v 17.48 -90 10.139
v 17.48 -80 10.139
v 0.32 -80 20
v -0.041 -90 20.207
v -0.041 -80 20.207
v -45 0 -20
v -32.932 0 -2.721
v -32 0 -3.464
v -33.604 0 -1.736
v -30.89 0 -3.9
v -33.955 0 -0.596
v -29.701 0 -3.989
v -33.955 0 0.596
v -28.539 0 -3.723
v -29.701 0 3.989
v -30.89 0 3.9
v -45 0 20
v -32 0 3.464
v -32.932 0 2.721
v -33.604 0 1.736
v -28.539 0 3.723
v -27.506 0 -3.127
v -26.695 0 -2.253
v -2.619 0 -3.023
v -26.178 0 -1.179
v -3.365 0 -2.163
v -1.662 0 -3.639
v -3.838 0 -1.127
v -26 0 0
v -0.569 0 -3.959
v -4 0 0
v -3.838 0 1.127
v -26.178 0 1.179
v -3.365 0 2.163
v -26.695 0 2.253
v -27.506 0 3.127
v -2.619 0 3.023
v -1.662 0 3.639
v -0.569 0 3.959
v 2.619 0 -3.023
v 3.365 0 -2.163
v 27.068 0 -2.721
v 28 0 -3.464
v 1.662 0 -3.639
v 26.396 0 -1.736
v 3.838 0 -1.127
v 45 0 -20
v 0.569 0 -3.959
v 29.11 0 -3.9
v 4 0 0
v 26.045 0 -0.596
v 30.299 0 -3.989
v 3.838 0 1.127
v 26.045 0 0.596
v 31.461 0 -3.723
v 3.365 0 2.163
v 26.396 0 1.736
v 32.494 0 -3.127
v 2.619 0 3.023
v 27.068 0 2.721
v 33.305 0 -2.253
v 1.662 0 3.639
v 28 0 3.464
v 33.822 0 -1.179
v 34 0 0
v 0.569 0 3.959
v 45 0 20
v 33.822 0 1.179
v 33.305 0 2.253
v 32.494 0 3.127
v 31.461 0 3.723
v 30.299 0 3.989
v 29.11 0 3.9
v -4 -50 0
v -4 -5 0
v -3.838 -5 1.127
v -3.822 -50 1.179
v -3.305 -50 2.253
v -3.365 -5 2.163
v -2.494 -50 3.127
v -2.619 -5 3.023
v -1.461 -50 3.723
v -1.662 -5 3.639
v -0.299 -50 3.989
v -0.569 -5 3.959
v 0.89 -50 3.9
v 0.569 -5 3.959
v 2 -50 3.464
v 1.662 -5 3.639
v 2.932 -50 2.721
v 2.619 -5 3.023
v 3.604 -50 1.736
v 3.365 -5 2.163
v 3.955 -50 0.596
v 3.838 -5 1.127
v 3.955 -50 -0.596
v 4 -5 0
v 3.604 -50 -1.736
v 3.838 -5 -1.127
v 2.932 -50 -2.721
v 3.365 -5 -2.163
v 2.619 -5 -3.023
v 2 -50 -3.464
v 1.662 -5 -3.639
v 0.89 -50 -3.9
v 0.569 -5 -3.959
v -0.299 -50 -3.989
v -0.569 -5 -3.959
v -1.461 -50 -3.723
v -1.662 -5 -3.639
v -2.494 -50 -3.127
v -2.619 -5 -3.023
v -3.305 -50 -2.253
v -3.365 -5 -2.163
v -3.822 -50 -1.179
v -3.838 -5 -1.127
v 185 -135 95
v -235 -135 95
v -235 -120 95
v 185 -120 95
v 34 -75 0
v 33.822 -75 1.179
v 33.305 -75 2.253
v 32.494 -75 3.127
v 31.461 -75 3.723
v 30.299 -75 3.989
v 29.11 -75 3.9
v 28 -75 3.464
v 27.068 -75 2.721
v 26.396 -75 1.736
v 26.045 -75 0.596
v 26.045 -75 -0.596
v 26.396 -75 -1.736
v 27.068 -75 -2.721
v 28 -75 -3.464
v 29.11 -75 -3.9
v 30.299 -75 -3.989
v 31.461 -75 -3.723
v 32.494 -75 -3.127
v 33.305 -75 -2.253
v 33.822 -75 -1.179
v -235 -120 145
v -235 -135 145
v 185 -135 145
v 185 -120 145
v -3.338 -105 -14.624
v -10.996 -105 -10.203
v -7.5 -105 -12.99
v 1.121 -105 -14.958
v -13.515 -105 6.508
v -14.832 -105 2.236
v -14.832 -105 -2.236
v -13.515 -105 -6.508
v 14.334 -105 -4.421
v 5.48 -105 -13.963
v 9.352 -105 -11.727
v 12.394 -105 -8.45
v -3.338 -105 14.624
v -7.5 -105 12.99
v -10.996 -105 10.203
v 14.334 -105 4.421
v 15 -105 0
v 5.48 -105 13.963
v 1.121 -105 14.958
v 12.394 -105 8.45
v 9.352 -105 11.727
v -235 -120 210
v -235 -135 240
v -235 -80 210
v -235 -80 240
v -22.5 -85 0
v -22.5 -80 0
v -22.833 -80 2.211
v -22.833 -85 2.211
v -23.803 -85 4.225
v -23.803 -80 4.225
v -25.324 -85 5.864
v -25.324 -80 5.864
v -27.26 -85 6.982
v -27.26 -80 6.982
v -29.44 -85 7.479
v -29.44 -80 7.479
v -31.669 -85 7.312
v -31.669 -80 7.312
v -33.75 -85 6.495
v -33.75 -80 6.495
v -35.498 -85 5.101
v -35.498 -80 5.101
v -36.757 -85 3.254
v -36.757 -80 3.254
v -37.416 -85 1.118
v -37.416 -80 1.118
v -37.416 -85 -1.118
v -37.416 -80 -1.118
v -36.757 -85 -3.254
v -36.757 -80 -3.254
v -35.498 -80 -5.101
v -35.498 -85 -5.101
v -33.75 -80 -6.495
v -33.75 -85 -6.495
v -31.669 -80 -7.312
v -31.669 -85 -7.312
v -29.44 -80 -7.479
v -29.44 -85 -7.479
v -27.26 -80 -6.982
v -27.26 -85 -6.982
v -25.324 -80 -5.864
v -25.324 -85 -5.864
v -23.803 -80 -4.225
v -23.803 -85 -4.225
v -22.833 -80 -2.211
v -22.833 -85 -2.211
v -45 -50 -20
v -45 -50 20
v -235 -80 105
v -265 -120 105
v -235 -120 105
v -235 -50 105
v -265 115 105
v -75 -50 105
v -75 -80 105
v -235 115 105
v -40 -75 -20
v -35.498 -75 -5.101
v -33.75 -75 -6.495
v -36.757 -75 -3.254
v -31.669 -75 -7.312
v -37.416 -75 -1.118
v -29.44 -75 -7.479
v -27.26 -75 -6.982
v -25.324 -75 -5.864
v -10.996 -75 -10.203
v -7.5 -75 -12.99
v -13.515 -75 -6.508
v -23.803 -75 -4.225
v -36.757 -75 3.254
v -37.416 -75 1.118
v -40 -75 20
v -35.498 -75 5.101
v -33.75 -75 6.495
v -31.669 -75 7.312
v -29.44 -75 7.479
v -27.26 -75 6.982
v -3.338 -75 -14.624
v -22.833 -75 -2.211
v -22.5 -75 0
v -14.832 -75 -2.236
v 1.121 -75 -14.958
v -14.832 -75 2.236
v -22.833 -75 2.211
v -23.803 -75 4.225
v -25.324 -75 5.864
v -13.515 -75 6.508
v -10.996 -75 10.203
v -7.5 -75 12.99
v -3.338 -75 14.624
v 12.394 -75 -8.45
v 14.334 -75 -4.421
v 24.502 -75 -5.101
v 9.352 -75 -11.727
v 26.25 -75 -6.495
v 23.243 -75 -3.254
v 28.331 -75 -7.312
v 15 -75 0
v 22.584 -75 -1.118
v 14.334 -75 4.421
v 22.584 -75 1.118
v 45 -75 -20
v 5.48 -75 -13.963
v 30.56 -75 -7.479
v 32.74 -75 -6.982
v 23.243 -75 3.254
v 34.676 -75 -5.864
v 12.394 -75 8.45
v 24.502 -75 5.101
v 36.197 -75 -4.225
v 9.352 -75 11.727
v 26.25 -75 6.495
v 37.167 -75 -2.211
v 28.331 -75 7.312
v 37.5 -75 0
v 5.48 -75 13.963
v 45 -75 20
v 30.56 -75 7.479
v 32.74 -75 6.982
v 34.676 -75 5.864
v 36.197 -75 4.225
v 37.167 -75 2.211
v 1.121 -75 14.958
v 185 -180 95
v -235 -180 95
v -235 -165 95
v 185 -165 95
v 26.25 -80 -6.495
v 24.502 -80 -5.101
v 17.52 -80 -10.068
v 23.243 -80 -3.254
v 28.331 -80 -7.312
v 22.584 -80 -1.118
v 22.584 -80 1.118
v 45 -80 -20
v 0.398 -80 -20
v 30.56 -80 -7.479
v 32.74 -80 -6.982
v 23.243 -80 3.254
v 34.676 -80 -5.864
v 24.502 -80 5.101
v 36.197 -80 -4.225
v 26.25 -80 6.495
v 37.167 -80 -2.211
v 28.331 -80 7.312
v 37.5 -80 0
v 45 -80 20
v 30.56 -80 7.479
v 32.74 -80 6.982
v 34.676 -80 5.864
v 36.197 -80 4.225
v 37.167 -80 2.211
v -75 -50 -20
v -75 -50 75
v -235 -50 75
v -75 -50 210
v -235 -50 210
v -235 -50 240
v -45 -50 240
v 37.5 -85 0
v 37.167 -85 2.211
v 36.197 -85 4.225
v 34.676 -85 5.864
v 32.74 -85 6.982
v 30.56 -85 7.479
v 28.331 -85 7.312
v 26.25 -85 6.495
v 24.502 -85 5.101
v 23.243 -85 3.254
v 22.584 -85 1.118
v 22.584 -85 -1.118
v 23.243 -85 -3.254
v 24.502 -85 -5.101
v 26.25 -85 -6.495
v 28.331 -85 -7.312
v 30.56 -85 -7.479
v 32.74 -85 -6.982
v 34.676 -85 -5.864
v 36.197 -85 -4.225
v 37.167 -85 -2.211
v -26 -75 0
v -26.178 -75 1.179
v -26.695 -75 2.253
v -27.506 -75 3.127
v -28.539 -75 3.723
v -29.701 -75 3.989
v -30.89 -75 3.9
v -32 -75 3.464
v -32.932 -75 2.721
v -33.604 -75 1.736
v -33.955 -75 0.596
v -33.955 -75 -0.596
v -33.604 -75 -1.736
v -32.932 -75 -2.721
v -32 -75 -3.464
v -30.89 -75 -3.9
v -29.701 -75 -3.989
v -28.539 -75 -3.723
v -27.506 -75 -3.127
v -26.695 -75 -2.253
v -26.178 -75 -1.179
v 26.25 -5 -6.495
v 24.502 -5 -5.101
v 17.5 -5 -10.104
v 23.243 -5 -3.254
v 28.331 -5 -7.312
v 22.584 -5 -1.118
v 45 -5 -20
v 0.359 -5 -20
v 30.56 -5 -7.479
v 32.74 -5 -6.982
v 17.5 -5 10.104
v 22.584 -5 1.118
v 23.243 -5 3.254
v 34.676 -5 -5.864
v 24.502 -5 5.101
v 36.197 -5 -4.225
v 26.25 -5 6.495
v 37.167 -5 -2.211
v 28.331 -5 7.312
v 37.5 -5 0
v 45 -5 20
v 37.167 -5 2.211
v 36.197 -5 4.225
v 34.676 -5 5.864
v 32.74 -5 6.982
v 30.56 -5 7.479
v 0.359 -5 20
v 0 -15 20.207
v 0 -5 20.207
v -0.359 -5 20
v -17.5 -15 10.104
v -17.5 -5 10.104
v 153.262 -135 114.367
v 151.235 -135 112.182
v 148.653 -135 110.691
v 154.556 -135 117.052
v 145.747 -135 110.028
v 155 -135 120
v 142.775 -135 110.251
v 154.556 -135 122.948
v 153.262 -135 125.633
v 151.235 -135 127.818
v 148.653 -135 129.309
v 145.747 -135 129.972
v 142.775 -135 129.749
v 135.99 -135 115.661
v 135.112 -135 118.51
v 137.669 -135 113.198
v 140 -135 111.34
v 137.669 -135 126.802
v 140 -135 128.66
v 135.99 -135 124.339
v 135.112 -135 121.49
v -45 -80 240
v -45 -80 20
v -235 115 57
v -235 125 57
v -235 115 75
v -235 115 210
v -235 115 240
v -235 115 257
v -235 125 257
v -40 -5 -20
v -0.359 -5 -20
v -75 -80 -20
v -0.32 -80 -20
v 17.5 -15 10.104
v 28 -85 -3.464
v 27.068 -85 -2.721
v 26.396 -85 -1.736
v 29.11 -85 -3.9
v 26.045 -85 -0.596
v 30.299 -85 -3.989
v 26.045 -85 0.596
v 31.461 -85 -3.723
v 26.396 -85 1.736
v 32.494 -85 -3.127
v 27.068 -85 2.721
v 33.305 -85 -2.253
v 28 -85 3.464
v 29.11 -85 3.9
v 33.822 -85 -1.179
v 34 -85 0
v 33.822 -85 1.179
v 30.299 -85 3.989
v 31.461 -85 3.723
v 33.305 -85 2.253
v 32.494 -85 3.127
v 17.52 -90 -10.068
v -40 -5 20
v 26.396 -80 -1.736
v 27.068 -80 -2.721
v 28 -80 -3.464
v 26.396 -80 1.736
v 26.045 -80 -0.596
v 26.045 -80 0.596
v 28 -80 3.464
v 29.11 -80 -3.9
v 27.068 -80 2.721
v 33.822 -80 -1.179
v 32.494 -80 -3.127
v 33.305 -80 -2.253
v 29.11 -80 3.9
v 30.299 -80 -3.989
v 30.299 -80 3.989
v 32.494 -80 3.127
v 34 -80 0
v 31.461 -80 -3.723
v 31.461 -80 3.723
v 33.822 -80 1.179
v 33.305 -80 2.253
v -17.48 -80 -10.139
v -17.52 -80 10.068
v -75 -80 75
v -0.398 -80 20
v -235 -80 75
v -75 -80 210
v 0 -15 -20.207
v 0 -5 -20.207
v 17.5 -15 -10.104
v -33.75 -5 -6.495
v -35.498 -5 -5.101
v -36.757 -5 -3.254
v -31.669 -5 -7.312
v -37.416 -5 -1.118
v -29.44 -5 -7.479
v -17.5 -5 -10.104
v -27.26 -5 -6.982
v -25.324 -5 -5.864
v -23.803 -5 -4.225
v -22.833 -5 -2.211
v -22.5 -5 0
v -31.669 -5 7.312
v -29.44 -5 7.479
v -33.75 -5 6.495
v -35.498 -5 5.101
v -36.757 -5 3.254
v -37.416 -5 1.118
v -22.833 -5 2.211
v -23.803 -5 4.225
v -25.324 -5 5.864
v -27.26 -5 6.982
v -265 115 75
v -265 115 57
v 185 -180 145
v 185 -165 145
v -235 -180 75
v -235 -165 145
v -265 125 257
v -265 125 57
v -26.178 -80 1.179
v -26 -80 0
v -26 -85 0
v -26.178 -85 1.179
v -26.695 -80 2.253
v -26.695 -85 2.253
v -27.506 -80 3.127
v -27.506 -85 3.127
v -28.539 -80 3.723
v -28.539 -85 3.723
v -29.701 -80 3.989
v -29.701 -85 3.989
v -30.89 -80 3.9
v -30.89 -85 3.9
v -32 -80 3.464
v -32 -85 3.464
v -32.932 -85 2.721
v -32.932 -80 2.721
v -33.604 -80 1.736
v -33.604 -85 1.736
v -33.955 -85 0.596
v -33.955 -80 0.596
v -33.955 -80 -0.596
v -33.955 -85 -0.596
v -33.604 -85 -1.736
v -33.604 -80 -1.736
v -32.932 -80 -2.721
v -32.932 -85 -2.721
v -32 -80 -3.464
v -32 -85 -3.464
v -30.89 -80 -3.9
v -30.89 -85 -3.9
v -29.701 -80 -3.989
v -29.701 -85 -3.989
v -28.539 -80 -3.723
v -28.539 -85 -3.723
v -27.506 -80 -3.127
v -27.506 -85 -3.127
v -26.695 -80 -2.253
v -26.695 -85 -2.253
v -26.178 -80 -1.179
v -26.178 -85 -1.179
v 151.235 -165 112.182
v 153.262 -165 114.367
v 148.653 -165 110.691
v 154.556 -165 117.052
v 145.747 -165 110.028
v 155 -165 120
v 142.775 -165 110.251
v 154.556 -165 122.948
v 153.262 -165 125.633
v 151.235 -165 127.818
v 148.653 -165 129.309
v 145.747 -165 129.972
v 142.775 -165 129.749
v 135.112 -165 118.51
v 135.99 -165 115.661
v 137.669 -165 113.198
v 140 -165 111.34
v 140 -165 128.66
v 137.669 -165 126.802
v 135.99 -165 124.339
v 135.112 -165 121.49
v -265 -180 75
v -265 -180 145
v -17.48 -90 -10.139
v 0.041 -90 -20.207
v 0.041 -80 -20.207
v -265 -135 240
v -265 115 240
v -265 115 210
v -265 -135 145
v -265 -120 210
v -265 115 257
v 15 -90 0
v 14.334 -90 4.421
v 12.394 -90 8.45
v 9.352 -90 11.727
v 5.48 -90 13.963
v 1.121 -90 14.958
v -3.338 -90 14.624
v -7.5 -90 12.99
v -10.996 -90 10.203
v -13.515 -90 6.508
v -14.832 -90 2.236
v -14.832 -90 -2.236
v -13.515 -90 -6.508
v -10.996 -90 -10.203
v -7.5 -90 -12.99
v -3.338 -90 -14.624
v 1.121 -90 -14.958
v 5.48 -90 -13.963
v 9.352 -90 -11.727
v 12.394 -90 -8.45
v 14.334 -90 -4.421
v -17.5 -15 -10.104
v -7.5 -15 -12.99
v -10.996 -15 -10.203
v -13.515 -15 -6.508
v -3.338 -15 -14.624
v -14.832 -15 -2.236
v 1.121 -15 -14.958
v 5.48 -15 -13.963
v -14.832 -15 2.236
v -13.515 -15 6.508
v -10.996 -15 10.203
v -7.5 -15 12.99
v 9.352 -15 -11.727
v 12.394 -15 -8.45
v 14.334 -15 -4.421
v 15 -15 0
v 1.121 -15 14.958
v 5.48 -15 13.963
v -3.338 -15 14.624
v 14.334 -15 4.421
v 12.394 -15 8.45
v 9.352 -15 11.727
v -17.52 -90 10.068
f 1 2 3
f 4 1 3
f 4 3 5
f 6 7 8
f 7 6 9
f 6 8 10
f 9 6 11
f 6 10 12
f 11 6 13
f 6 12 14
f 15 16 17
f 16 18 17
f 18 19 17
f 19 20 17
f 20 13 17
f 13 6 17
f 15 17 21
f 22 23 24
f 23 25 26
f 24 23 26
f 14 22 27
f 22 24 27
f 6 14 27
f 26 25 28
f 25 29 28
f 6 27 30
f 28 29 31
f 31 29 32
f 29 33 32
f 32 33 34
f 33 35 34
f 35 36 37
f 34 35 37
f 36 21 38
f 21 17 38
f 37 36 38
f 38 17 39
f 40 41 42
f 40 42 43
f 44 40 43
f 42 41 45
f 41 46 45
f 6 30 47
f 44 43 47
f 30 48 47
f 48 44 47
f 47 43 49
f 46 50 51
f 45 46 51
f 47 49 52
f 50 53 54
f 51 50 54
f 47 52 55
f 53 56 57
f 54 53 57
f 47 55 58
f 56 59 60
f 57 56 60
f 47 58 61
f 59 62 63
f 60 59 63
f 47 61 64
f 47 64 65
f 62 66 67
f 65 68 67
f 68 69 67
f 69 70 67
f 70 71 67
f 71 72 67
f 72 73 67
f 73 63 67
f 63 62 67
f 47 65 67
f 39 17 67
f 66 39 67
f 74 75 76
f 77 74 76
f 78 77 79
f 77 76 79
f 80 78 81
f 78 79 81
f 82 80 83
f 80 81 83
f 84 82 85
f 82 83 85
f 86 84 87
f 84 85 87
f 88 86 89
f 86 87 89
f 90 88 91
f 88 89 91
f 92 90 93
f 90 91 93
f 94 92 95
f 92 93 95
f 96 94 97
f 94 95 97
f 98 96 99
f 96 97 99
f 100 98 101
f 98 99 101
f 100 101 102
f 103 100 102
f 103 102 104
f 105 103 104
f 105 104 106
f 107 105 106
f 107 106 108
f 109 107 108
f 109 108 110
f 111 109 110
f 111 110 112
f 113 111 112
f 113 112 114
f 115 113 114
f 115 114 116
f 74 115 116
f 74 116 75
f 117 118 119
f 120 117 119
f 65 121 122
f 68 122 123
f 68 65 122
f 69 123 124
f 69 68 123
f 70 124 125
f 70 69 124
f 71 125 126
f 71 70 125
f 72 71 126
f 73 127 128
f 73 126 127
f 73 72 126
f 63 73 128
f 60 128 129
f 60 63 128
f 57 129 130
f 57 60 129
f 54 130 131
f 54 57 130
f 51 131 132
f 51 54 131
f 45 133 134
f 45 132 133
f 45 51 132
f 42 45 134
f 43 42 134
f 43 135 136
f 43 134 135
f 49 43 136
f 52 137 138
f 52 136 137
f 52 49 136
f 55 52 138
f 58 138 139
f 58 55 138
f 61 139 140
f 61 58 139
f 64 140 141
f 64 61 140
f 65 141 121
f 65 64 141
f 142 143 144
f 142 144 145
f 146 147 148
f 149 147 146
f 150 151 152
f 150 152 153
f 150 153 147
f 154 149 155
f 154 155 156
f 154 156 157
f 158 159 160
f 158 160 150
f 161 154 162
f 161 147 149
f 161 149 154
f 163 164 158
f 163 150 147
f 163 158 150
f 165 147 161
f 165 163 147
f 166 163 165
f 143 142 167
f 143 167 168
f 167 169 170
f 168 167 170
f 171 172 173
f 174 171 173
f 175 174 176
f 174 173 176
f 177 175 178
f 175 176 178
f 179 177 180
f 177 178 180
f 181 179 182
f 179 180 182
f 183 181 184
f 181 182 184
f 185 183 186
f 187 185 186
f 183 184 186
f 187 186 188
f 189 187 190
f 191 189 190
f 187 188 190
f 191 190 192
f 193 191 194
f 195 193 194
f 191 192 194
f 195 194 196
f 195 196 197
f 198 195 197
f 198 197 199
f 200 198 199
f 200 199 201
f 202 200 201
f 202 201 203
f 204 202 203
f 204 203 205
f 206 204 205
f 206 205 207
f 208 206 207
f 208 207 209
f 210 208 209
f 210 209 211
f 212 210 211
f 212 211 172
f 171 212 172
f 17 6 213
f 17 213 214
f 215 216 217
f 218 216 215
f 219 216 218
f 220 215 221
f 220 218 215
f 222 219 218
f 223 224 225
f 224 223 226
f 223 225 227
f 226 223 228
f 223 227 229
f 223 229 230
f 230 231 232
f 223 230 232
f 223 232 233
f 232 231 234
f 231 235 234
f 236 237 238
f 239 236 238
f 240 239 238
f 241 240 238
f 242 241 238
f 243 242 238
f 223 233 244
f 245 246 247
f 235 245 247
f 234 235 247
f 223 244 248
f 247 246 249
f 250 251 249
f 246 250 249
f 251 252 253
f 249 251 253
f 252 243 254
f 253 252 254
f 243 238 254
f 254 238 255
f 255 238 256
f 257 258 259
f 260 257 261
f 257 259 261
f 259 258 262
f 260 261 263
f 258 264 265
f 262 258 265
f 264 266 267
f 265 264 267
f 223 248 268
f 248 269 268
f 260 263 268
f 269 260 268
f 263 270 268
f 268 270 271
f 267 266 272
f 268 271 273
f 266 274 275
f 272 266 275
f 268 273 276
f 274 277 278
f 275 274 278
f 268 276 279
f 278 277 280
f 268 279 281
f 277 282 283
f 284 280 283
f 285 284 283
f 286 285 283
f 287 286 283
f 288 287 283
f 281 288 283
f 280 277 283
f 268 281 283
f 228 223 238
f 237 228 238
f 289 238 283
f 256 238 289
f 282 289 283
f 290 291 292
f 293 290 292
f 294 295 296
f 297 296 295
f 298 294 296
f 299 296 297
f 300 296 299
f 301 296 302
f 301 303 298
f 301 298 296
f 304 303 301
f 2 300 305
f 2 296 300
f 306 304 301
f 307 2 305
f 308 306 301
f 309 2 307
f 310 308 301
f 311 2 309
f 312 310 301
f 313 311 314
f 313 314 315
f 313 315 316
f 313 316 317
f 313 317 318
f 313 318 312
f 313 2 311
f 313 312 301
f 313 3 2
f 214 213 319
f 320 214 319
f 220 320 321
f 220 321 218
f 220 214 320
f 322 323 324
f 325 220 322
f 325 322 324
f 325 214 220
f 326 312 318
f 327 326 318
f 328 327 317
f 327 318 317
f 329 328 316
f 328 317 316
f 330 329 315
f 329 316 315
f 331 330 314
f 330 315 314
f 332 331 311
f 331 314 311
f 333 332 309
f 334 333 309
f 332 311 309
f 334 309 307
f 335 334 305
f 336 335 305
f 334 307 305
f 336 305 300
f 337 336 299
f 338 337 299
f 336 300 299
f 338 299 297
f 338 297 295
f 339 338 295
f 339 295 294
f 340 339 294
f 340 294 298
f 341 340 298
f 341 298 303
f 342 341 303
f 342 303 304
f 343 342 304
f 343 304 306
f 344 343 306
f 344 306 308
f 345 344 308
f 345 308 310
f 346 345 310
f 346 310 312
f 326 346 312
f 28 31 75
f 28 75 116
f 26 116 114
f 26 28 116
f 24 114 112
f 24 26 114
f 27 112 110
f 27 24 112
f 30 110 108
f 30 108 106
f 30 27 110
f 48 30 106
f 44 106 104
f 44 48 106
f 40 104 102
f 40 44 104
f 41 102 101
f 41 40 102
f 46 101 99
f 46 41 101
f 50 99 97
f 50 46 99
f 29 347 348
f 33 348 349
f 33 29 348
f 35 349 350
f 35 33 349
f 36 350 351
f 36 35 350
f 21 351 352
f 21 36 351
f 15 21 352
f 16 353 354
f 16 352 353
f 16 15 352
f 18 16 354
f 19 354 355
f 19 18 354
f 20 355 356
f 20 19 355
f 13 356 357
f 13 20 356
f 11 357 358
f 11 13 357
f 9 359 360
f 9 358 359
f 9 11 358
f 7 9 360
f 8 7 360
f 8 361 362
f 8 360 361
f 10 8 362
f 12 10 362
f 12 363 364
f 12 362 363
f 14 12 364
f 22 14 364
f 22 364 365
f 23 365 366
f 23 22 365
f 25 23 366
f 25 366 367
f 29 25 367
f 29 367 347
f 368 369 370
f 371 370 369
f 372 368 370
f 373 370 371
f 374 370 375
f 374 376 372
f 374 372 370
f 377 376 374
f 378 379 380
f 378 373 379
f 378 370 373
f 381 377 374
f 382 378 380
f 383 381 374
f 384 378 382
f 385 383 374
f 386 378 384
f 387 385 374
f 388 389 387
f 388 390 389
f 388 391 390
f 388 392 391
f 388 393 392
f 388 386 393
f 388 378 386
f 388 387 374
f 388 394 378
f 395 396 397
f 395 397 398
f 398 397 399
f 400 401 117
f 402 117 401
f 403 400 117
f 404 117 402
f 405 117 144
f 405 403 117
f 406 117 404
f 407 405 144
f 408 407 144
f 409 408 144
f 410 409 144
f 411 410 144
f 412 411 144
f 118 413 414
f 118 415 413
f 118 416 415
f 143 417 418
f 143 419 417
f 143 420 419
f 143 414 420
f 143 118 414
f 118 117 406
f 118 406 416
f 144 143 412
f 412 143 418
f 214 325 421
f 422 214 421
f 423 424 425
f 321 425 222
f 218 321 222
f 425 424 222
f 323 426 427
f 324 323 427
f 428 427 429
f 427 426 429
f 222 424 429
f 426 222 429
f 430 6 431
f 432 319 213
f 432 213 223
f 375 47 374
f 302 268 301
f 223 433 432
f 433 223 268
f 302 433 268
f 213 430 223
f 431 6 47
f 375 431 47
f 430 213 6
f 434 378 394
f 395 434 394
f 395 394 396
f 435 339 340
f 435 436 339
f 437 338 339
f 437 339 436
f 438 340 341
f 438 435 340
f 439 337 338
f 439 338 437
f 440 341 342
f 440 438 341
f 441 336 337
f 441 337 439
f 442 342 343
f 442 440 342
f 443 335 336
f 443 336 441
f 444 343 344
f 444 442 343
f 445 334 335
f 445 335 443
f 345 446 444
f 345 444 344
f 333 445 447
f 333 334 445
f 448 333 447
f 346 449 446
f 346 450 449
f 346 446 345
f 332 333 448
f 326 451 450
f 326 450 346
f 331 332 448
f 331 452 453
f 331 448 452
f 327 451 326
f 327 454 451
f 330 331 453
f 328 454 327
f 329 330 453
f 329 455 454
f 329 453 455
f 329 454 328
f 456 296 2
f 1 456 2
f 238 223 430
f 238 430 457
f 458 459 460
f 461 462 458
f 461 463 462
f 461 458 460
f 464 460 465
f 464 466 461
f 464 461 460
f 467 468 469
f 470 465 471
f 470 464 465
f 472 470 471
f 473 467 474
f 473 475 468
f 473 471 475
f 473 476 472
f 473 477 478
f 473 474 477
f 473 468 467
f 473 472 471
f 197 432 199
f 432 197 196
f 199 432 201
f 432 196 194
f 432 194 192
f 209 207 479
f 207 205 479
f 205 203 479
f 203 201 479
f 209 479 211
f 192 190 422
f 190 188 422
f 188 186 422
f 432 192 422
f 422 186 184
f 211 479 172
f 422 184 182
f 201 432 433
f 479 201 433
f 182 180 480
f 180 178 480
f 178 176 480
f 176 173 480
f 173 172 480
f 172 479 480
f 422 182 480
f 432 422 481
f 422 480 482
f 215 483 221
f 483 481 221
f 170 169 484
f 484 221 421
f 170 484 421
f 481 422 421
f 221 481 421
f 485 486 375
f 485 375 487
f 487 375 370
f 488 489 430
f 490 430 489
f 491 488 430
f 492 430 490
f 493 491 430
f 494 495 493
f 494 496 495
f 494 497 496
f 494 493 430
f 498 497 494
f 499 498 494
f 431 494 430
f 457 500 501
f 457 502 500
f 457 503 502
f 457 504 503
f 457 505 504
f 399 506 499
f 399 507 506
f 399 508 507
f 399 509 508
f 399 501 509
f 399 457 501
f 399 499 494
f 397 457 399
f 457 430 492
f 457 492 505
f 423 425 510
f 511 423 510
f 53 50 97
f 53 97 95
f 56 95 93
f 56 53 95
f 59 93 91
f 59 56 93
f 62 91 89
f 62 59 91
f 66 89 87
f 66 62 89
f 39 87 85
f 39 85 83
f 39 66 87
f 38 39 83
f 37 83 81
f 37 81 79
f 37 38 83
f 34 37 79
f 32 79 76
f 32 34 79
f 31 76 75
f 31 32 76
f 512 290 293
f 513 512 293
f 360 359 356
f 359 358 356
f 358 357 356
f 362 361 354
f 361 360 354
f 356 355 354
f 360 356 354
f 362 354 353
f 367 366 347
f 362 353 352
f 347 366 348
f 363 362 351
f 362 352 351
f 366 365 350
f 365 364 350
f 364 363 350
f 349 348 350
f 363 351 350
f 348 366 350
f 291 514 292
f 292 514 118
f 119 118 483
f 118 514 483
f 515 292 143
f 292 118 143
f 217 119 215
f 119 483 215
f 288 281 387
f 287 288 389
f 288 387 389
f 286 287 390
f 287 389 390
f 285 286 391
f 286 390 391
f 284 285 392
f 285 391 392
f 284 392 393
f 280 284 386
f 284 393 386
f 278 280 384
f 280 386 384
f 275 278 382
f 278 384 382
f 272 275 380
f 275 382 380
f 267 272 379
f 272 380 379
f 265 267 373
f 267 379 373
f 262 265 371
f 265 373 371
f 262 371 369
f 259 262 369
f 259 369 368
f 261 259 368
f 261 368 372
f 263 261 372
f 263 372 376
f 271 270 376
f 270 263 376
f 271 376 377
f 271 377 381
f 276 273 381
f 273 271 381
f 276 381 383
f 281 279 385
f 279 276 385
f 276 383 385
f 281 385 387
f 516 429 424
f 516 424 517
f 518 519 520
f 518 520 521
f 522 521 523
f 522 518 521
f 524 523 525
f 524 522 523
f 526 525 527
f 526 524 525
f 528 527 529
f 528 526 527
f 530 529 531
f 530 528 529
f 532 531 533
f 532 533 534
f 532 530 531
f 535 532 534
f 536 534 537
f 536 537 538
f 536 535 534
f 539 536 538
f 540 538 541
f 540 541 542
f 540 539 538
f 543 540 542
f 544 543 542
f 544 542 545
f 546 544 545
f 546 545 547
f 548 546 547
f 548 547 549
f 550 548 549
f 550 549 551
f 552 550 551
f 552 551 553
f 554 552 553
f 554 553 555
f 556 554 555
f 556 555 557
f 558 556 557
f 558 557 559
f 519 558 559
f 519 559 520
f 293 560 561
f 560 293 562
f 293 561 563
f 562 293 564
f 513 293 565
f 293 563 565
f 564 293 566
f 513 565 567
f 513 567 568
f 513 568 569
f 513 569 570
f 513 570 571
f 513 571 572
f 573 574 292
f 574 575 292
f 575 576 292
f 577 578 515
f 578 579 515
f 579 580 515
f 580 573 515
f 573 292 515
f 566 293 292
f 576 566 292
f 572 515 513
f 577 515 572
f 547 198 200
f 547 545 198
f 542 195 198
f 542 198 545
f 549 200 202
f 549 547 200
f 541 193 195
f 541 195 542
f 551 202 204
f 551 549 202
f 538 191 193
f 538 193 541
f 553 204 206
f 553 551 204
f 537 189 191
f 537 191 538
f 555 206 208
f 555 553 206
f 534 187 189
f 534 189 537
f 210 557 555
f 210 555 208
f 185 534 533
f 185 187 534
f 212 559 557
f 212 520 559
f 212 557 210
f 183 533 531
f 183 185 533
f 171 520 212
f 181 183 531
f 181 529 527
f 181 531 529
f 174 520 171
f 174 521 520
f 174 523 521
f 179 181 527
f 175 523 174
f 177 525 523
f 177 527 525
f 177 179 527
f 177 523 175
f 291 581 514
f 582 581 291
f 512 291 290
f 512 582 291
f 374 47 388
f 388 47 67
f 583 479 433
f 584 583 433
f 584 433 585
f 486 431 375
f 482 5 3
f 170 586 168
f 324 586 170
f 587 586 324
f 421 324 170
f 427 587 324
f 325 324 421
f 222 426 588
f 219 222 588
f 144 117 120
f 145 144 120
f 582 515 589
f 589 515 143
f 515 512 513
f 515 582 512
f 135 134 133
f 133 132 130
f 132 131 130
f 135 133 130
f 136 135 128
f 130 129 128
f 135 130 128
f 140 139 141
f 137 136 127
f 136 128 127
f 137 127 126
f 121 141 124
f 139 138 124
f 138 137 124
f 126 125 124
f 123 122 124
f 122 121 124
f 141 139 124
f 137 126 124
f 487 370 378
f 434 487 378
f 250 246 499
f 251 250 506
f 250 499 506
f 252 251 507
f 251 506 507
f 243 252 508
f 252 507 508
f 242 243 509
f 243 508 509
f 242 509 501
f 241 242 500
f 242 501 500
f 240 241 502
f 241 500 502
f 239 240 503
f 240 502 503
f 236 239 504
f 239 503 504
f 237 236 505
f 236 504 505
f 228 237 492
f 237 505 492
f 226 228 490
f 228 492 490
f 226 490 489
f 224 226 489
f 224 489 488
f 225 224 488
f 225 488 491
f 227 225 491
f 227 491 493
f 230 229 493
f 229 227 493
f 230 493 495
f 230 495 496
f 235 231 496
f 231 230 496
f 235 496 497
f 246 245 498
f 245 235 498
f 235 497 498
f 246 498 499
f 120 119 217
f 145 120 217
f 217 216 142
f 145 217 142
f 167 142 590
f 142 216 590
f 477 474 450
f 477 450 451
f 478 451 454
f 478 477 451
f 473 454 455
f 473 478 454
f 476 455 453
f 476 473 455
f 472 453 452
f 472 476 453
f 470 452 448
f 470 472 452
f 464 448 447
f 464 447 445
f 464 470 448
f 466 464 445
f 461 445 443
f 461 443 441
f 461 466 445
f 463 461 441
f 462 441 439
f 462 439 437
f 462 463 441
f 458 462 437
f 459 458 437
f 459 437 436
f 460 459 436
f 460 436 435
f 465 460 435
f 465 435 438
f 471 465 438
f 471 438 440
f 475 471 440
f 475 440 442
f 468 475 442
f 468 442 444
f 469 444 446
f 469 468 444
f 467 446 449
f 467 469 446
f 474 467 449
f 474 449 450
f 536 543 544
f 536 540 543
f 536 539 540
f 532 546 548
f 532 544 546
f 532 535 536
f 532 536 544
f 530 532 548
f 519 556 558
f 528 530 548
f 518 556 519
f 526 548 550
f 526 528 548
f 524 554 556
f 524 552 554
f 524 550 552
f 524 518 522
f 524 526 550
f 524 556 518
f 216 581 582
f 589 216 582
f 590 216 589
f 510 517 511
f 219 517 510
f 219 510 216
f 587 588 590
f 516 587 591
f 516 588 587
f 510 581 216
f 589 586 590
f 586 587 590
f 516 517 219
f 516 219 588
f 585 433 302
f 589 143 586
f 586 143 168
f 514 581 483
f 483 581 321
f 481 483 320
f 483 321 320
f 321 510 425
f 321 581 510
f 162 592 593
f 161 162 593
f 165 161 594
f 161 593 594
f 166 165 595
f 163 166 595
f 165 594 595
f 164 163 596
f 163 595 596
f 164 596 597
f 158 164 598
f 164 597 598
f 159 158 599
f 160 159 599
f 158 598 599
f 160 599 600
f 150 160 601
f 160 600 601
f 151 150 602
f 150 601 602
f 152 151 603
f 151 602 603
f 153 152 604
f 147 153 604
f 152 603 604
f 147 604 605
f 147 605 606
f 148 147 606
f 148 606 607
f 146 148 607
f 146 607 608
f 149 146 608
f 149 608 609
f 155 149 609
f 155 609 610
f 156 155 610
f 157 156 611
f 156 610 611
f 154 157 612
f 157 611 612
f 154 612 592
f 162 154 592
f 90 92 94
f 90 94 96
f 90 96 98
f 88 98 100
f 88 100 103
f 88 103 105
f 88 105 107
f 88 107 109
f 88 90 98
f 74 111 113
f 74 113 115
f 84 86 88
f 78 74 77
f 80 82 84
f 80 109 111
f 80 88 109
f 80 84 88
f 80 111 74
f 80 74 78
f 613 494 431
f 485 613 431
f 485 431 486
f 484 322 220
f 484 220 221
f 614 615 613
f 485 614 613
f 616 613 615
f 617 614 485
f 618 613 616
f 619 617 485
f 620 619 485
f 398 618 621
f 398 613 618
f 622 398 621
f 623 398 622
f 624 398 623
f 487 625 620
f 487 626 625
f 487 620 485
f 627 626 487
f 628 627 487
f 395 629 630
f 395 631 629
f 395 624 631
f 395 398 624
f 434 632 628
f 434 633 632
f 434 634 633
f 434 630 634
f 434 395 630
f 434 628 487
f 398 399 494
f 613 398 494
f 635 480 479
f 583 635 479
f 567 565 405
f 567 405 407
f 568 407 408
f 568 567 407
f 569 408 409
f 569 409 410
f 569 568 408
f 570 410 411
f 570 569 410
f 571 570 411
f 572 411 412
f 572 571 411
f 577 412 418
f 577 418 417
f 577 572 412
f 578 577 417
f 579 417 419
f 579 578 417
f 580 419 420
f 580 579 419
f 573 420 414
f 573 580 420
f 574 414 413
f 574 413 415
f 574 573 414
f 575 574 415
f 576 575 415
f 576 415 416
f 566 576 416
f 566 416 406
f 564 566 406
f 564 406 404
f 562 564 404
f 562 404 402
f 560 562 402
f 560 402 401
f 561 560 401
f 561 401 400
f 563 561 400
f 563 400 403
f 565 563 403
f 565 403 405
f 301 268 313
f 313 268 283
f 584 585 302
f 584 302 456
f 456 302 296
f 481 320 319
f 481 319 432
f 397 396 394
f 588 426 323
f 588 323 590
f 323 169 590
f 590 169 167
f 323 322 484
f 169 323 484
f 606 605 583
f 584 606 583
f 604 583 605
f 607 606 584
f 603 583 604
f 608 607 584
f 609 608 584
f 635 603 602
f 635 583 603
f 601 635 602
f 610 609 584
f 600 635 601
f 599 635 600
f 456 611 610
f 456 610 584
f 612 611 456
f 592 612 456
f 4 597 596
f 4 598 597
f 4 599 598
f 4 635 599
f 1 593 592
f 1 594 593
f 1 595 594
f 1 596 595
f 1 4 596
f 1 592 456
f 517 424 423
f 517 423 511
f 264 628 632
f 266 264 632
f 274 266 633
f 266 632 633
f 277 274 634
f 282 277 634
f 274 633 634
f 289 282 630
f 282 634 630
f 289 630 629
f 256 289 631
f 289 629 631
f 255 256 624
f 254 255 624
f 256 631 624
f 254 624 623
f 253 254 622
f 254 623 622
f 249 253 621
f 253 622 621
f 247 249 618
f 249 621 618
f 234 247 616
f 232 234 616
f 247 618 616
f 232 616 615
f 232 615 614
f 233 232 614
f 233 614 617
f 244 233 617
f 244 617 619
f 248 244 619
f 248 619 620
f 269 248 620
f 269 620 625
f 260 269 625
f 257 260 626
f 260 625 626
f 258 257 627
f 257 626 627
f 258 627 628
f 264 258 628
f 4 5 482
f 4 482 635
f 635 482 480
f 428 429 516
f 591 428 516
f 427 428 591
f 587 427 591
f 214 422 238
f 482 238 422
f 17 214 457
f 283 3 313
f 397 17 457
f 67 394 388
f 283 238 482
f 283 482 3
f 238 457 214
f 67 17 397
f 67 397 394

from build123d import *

# Parameters (mm, degrees)
F0_W      = 90
F0_H      = 40
F0_R      = 4
F1_DEPTH  = 5
F3_DEPTH  = 10
F4_R      = 15
F5_DEPTH  = 60
F6_R      = 7.5
F6_R_2    = 4
F7_DEPTH  = 80
F8_W      = 90
F8_H      = 40
F9_DEPTH  = 5
F11_DEPTH = 10
F12_R     = 15
F13_DEPTH = 15
F14_W     = 5
F14_H     = 40
F15_DEPTH = 70
F16_R     = 4
F17_DEPTH = 50
F18_W     = 30
F18_H     = 260
F19_DEPTH = 30
F20_W     = 30
F20_H     = 30
F21_DEPTH = 190
F22_W     = 30
F22_H     = 30
F23_DEPTH = 205
F24_DEPTH = 40
F25_W     = 30
F25_H     = 200
F26_DEPTH = 10
F27_W     = 30
F27_H     = 165
F28_DEPTH = 60
F29_W     = 15
F29_H     = 50
F30_DEPTH = 420
F31_W     = 45
F31_H     = 121.339908
F32_DEPTH = 40
F33_R     = 10
F34_DEPTH = 60


with BuildPart() as f1:
    # F0 (on Front) → F1 (new body)
    with BuildSketch(Plane.XZ):
        Rectangle(F0_W, F0_H)
        with Locations((-30, 0)):
            Circle(F0_R, mode=Mode.SUBTRACT)
        Circle(F0_R, mode=Mode.SUBTRACT)
        with Locations((30, 0)):
            Circle(F0_R, mode=Mode.SUBTRACT)
    extrude(amount=F1_DEPTH)

    # F2 (on face) → F3 (join)
    with BuildSketch(Plane.XZ.offset(5)):
        Polygon((17.5, -10.10363), (17.5, 10.10363), (0, 20.207259), (-17.5, 10.10363), (-17.5, -10.10363), (0, -20.207259), align=None)
    extrude(amount=F3_DEPTH)

    # F4 (on face) → F5 (join)
    with BuildSketch(Plane.XZ.offset(15)):
        Circle(F4_R)
    extrude(amount=F5_DEPTH)

    # F6 (on face) → F7 (join)
    with BuildSketch(Plane.XZ.offset(5)):
        with Locations((30, 0)):
            Circle(F6_R)
        with Locations((30, 0)):
            Circle(F6_R_2, mode=Mode.SUBTRACT)
        with Locations((-30, 0)):
            Circle(F6_R)
        with Locations((-30, 0)):
            Circle(F6_R_2, mode=Mode.SUBTRACT)
    extrude(amount=F7_DEPTH)

    # F8 (on face) → F9 (join)
    with BuildSketch(Plane.XZ.offset(75)):
        Rectangle(F8_W, F8_H)
    extrude(amount=F9_DEPTH)

    # F10 (on face) → F11 (join)
    with BuildSketch(Plane.XZ.offset(80)):
        Polygon((0.040823, -20.207218), (17.520376, -10.068255), (17.479553, 10.138963), (-0.040823, 20.207218), (-17.520376, 10.068255), (-17.479553, -10.138963), align=None)
    extrude(amount=F11_DEPTH)

    # F12 (on face) → F13 (join)
    with BuildSketch(Plane.XZ.offset(90)):
        Circle(F12_R)
    extrude(amount=F13_DEPTH)

    # F14 (on face) → F15 (join, through all)
    with BuildSketch(Plane.XZ.offset(5)):
        with Locations((-42.5, 0)):
            Rectangle(F14_W, F14_H)
    extrude(amount=F15_DEPTH)

    # F16 (on face) → F17 (cut)
    with BuildSketch(Plane(origin=(0, 0, 0), x_dir=(-1, 0, 0), z_dir=(0, 1, 0))):
        Circle(F16_R)
    extrude(amount=-F17_DEPTH, mode=Mode.SUBTRACT)

    # F18 (on face) → F19 (join)
    with BuildSketch(Plane(origin=(-45, 0, 0), x_dir=(0, -1, 0), z_dir=(-1, 0, 0))):
        with Locations((65, 110)):
            Rectangle(F18_W, F18_H)
    extrude(amount=F19_DEPTH)

    # F20 (on face) → F21 (join)
    with BuildSketch(Plane(origin=(-75, 0, 0), x_dir=(0, -1, 0), z_dir=(-1, 0, 0))):
        with Locations((65, 90)):
            Rectangle(F20_W, F20_H)
        with Locations((65, 225)):
            Rectangle(F20_W, F20_H)
    extrude(amount=F21_DEPTH)

    # F22 (on face) → F23 (join)
    with BuildSketch(Plane.XZ.offset(80)):
        with Locations((-250, 90)):
            Rectangle(F22_W, F22_H)
        with Locations((-250, 225)):
            Rectangle(F22_W, F22_H)
    extrude(amount=-F23_DEPTH)

    # F22 (on face) → F24 (join)
    with BuildSketch(Plane.XZ.offset(80)):
        with Locations((-250, 90)):
            Rectangle(F22_W, F22_H)
        with Locations((-250, 225)):
            Rectangle(F22_W, F22_H)
    extrude(amount=F24_DEPTH)

    # F25 (on face) → F26 (join)
    with BuildSketch(Plane(origin=(0, 125, 0), x_dir=(-1, 0, 0), z_dir=(0, 1, 0))):
        with Locations((250, 157)):
            Rectangle(F25_W, F25_H)
    extrude(amount=-F26_DEPTH)

    # F27 (on face) → F28 (join)
    with BuildSketch(Plane.XZ.offset(120)):
        with Locations((-250, 157.5)):
            Rectangle(F27_W, F27_H)
    extrude(amount=F28_DEPTH)

    # F29 (on face) → F30 (join)
    with BuildSketch(Plane.YZ.offset(-235)):
        with Locations((-172.5, 120)):
            Rectangle(F29_W, F29_H)
        with Locations((-127.5, 120)):
            Rectangle(F29_W, F29_H)
    extrude(amount=F30_DEPTH)

    # F31 (on face) → F32 (cut)
    with BuildSketch(Plane.YZ.offset(-235)):
        with Locations((-157.5, 205.669954)):
            Rectangle(F31_W, F31_H)
    extrude(amount=-F32_DEPTH, mode=Mode.SUBTRACT)

    # F33 (on face) → F34 (join)
    with BuildSketch(Plane.XZ.offset(180)):
        with Locations((145, 120)):
            Circle(F33_R)
    extrude(amount=-F34_DEPTH)


solid = f1.part
